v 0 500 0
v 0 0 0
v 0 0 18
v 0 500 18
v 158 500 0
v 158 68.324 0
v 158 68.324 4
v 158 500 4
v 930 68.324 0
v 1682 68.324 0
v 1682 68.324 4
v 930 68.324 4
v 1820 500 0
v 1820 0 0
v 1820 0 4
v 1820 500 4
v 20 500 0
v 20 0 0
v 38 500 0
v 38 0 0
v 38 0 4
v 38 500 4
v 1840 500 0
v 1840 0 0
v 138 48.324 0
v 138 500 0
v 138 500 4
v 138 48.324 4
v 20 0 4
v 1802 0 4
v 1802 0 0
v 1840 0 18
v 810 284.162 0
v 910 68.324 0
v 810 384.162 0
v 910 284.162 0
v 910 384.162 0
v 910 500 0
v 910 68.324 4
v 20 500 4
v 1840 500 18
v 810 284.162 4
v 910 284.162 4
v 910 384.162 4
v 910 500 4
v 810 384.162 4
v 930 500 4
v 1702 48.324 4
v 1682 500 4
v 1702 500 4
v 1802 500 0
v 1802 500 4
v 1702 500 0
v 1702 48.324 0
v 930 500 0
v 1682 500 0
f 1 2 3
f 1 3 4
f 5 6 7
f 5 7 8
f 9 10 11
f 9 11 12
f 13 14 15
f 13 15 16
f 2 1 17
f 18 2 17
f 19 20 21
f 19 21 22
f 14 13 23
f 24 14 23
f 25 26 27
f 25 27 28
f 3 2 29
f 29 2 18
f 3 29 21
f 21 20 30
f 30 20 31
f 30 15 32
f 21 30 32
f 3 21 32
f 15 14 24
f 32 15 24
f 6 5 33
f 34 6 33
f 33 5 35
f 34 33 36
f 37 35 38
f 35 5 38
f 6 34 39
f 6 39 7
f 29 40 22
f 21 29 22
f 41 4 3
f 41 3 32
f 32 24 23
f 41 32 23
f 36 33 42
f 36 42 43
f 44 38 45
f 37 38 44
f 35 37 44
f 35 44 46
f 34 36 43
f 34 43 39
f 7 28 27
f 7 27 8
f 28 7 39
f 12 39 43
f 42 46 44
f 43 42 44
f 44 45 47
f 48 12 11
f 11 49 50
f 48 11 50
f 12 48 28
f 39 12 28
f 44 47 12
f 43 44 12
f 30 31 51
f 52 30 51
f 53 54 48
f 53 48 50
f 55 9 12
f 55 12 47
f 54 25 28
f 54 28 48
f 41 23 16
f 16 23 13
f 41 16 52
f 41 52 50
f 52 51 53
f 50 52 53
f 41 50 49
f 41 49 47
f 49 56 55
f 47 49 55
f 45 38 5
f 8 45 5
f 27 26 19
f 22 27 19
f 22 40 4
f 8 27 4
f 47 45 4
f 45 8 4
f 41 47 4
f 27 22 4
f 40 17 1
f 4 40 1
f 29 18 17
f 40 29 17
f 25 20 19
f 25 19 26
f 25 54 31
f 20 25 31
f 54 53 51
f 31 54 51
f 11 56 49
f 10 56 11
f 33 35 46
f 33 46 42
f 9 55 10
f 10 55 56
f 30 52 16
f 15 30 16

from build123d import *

# Parameters (mm, degrees)
F1_W     = 20
F1_H     = 500
F1_W_2   = 18
F1_W_3   = 752
F1_H_2   = 431.6755512357
F2_DEPTH = 18
F3_DEPTH = 4


with BuildPart() as f2:
    # F1 (on Top) → F2 (new body)
    with BuildSketch(Plane.XY):
        with Locations((10, 250)):
            Rectangle(F1_W, F1_H)
        with Locations((29, 250)):
            Rectangle(F1_W_2, F1_H)
        Polygon((38, 500), (38, 0), (1802, 0), (1802, 500), (1702, 500), (1702, 68.3244487643), (1702, 48.3244487643), (138, 48.3244487643), (138, 68.3244487643), (138, 500), align=None)
        with Locations((1811, 250)):
            Rectangle(F1_W_2, F1_H)
        Polygon((158, 500), (138, 500), (138, 68.3244487643), (138, 48.3244487643), (1702, 48.3244487643), (1702, 68.3244487643), (1702, 500), (1682, 500), (1682, 68.3244487643), (930, 68.3244487643), (930, 500), (910, 500), (910, 384.1622243822), (810, 384.1622243822), (810, 284.1622243822), (910, 284.1622243822), (910, 68.3244487643), (158, 68.3244487643), align=None)
        with Locations((1830, 250)):
            Rectangle(F1_W, F1_H)
        Polygon((910, 500), (158, 500), (158, 68.3244487643), (910, 68.3244487643), (910, 284.1622243822), (810, 284.1622243822), (810, 384.1622243822), (910, 384.1622243822), align=None)
        with Locations((1306, 284.1622243822)):
            Rectangle(F1_W_3, F1_H_2)
    extrude(amount=F2_DEPTH)

    # F1 (on Top) → F3 (cut)
    with BuildSketch(Plane.XY):
        Polygon((158, 500), (138, 500), (138, 68.3244487643), (138, 48.3244487643), (1702, 48.3244487643), (1702, 68.3244487643), (1702, 500), (1682, 500), (1682, 68.3244487643), (930, 68.3244487643), (930, 500), (910, 500), (910, 384.1622243822), (810, 384.1622243822), (810, 284.1622243822), (910, 284.1622243822), (910, 68.3244487643), (158, 68.3244487643), align=None)
        with Locations((29, 250)):
            Rectangle(F1_W_2, F1_H)
        with Locations((1811, 250)):
            Rectangle(F1_W_2, F1_H)
    extrude(amount=F3_DEPTH, mode=Mode.SUBTRACT)


solid = f2.part
